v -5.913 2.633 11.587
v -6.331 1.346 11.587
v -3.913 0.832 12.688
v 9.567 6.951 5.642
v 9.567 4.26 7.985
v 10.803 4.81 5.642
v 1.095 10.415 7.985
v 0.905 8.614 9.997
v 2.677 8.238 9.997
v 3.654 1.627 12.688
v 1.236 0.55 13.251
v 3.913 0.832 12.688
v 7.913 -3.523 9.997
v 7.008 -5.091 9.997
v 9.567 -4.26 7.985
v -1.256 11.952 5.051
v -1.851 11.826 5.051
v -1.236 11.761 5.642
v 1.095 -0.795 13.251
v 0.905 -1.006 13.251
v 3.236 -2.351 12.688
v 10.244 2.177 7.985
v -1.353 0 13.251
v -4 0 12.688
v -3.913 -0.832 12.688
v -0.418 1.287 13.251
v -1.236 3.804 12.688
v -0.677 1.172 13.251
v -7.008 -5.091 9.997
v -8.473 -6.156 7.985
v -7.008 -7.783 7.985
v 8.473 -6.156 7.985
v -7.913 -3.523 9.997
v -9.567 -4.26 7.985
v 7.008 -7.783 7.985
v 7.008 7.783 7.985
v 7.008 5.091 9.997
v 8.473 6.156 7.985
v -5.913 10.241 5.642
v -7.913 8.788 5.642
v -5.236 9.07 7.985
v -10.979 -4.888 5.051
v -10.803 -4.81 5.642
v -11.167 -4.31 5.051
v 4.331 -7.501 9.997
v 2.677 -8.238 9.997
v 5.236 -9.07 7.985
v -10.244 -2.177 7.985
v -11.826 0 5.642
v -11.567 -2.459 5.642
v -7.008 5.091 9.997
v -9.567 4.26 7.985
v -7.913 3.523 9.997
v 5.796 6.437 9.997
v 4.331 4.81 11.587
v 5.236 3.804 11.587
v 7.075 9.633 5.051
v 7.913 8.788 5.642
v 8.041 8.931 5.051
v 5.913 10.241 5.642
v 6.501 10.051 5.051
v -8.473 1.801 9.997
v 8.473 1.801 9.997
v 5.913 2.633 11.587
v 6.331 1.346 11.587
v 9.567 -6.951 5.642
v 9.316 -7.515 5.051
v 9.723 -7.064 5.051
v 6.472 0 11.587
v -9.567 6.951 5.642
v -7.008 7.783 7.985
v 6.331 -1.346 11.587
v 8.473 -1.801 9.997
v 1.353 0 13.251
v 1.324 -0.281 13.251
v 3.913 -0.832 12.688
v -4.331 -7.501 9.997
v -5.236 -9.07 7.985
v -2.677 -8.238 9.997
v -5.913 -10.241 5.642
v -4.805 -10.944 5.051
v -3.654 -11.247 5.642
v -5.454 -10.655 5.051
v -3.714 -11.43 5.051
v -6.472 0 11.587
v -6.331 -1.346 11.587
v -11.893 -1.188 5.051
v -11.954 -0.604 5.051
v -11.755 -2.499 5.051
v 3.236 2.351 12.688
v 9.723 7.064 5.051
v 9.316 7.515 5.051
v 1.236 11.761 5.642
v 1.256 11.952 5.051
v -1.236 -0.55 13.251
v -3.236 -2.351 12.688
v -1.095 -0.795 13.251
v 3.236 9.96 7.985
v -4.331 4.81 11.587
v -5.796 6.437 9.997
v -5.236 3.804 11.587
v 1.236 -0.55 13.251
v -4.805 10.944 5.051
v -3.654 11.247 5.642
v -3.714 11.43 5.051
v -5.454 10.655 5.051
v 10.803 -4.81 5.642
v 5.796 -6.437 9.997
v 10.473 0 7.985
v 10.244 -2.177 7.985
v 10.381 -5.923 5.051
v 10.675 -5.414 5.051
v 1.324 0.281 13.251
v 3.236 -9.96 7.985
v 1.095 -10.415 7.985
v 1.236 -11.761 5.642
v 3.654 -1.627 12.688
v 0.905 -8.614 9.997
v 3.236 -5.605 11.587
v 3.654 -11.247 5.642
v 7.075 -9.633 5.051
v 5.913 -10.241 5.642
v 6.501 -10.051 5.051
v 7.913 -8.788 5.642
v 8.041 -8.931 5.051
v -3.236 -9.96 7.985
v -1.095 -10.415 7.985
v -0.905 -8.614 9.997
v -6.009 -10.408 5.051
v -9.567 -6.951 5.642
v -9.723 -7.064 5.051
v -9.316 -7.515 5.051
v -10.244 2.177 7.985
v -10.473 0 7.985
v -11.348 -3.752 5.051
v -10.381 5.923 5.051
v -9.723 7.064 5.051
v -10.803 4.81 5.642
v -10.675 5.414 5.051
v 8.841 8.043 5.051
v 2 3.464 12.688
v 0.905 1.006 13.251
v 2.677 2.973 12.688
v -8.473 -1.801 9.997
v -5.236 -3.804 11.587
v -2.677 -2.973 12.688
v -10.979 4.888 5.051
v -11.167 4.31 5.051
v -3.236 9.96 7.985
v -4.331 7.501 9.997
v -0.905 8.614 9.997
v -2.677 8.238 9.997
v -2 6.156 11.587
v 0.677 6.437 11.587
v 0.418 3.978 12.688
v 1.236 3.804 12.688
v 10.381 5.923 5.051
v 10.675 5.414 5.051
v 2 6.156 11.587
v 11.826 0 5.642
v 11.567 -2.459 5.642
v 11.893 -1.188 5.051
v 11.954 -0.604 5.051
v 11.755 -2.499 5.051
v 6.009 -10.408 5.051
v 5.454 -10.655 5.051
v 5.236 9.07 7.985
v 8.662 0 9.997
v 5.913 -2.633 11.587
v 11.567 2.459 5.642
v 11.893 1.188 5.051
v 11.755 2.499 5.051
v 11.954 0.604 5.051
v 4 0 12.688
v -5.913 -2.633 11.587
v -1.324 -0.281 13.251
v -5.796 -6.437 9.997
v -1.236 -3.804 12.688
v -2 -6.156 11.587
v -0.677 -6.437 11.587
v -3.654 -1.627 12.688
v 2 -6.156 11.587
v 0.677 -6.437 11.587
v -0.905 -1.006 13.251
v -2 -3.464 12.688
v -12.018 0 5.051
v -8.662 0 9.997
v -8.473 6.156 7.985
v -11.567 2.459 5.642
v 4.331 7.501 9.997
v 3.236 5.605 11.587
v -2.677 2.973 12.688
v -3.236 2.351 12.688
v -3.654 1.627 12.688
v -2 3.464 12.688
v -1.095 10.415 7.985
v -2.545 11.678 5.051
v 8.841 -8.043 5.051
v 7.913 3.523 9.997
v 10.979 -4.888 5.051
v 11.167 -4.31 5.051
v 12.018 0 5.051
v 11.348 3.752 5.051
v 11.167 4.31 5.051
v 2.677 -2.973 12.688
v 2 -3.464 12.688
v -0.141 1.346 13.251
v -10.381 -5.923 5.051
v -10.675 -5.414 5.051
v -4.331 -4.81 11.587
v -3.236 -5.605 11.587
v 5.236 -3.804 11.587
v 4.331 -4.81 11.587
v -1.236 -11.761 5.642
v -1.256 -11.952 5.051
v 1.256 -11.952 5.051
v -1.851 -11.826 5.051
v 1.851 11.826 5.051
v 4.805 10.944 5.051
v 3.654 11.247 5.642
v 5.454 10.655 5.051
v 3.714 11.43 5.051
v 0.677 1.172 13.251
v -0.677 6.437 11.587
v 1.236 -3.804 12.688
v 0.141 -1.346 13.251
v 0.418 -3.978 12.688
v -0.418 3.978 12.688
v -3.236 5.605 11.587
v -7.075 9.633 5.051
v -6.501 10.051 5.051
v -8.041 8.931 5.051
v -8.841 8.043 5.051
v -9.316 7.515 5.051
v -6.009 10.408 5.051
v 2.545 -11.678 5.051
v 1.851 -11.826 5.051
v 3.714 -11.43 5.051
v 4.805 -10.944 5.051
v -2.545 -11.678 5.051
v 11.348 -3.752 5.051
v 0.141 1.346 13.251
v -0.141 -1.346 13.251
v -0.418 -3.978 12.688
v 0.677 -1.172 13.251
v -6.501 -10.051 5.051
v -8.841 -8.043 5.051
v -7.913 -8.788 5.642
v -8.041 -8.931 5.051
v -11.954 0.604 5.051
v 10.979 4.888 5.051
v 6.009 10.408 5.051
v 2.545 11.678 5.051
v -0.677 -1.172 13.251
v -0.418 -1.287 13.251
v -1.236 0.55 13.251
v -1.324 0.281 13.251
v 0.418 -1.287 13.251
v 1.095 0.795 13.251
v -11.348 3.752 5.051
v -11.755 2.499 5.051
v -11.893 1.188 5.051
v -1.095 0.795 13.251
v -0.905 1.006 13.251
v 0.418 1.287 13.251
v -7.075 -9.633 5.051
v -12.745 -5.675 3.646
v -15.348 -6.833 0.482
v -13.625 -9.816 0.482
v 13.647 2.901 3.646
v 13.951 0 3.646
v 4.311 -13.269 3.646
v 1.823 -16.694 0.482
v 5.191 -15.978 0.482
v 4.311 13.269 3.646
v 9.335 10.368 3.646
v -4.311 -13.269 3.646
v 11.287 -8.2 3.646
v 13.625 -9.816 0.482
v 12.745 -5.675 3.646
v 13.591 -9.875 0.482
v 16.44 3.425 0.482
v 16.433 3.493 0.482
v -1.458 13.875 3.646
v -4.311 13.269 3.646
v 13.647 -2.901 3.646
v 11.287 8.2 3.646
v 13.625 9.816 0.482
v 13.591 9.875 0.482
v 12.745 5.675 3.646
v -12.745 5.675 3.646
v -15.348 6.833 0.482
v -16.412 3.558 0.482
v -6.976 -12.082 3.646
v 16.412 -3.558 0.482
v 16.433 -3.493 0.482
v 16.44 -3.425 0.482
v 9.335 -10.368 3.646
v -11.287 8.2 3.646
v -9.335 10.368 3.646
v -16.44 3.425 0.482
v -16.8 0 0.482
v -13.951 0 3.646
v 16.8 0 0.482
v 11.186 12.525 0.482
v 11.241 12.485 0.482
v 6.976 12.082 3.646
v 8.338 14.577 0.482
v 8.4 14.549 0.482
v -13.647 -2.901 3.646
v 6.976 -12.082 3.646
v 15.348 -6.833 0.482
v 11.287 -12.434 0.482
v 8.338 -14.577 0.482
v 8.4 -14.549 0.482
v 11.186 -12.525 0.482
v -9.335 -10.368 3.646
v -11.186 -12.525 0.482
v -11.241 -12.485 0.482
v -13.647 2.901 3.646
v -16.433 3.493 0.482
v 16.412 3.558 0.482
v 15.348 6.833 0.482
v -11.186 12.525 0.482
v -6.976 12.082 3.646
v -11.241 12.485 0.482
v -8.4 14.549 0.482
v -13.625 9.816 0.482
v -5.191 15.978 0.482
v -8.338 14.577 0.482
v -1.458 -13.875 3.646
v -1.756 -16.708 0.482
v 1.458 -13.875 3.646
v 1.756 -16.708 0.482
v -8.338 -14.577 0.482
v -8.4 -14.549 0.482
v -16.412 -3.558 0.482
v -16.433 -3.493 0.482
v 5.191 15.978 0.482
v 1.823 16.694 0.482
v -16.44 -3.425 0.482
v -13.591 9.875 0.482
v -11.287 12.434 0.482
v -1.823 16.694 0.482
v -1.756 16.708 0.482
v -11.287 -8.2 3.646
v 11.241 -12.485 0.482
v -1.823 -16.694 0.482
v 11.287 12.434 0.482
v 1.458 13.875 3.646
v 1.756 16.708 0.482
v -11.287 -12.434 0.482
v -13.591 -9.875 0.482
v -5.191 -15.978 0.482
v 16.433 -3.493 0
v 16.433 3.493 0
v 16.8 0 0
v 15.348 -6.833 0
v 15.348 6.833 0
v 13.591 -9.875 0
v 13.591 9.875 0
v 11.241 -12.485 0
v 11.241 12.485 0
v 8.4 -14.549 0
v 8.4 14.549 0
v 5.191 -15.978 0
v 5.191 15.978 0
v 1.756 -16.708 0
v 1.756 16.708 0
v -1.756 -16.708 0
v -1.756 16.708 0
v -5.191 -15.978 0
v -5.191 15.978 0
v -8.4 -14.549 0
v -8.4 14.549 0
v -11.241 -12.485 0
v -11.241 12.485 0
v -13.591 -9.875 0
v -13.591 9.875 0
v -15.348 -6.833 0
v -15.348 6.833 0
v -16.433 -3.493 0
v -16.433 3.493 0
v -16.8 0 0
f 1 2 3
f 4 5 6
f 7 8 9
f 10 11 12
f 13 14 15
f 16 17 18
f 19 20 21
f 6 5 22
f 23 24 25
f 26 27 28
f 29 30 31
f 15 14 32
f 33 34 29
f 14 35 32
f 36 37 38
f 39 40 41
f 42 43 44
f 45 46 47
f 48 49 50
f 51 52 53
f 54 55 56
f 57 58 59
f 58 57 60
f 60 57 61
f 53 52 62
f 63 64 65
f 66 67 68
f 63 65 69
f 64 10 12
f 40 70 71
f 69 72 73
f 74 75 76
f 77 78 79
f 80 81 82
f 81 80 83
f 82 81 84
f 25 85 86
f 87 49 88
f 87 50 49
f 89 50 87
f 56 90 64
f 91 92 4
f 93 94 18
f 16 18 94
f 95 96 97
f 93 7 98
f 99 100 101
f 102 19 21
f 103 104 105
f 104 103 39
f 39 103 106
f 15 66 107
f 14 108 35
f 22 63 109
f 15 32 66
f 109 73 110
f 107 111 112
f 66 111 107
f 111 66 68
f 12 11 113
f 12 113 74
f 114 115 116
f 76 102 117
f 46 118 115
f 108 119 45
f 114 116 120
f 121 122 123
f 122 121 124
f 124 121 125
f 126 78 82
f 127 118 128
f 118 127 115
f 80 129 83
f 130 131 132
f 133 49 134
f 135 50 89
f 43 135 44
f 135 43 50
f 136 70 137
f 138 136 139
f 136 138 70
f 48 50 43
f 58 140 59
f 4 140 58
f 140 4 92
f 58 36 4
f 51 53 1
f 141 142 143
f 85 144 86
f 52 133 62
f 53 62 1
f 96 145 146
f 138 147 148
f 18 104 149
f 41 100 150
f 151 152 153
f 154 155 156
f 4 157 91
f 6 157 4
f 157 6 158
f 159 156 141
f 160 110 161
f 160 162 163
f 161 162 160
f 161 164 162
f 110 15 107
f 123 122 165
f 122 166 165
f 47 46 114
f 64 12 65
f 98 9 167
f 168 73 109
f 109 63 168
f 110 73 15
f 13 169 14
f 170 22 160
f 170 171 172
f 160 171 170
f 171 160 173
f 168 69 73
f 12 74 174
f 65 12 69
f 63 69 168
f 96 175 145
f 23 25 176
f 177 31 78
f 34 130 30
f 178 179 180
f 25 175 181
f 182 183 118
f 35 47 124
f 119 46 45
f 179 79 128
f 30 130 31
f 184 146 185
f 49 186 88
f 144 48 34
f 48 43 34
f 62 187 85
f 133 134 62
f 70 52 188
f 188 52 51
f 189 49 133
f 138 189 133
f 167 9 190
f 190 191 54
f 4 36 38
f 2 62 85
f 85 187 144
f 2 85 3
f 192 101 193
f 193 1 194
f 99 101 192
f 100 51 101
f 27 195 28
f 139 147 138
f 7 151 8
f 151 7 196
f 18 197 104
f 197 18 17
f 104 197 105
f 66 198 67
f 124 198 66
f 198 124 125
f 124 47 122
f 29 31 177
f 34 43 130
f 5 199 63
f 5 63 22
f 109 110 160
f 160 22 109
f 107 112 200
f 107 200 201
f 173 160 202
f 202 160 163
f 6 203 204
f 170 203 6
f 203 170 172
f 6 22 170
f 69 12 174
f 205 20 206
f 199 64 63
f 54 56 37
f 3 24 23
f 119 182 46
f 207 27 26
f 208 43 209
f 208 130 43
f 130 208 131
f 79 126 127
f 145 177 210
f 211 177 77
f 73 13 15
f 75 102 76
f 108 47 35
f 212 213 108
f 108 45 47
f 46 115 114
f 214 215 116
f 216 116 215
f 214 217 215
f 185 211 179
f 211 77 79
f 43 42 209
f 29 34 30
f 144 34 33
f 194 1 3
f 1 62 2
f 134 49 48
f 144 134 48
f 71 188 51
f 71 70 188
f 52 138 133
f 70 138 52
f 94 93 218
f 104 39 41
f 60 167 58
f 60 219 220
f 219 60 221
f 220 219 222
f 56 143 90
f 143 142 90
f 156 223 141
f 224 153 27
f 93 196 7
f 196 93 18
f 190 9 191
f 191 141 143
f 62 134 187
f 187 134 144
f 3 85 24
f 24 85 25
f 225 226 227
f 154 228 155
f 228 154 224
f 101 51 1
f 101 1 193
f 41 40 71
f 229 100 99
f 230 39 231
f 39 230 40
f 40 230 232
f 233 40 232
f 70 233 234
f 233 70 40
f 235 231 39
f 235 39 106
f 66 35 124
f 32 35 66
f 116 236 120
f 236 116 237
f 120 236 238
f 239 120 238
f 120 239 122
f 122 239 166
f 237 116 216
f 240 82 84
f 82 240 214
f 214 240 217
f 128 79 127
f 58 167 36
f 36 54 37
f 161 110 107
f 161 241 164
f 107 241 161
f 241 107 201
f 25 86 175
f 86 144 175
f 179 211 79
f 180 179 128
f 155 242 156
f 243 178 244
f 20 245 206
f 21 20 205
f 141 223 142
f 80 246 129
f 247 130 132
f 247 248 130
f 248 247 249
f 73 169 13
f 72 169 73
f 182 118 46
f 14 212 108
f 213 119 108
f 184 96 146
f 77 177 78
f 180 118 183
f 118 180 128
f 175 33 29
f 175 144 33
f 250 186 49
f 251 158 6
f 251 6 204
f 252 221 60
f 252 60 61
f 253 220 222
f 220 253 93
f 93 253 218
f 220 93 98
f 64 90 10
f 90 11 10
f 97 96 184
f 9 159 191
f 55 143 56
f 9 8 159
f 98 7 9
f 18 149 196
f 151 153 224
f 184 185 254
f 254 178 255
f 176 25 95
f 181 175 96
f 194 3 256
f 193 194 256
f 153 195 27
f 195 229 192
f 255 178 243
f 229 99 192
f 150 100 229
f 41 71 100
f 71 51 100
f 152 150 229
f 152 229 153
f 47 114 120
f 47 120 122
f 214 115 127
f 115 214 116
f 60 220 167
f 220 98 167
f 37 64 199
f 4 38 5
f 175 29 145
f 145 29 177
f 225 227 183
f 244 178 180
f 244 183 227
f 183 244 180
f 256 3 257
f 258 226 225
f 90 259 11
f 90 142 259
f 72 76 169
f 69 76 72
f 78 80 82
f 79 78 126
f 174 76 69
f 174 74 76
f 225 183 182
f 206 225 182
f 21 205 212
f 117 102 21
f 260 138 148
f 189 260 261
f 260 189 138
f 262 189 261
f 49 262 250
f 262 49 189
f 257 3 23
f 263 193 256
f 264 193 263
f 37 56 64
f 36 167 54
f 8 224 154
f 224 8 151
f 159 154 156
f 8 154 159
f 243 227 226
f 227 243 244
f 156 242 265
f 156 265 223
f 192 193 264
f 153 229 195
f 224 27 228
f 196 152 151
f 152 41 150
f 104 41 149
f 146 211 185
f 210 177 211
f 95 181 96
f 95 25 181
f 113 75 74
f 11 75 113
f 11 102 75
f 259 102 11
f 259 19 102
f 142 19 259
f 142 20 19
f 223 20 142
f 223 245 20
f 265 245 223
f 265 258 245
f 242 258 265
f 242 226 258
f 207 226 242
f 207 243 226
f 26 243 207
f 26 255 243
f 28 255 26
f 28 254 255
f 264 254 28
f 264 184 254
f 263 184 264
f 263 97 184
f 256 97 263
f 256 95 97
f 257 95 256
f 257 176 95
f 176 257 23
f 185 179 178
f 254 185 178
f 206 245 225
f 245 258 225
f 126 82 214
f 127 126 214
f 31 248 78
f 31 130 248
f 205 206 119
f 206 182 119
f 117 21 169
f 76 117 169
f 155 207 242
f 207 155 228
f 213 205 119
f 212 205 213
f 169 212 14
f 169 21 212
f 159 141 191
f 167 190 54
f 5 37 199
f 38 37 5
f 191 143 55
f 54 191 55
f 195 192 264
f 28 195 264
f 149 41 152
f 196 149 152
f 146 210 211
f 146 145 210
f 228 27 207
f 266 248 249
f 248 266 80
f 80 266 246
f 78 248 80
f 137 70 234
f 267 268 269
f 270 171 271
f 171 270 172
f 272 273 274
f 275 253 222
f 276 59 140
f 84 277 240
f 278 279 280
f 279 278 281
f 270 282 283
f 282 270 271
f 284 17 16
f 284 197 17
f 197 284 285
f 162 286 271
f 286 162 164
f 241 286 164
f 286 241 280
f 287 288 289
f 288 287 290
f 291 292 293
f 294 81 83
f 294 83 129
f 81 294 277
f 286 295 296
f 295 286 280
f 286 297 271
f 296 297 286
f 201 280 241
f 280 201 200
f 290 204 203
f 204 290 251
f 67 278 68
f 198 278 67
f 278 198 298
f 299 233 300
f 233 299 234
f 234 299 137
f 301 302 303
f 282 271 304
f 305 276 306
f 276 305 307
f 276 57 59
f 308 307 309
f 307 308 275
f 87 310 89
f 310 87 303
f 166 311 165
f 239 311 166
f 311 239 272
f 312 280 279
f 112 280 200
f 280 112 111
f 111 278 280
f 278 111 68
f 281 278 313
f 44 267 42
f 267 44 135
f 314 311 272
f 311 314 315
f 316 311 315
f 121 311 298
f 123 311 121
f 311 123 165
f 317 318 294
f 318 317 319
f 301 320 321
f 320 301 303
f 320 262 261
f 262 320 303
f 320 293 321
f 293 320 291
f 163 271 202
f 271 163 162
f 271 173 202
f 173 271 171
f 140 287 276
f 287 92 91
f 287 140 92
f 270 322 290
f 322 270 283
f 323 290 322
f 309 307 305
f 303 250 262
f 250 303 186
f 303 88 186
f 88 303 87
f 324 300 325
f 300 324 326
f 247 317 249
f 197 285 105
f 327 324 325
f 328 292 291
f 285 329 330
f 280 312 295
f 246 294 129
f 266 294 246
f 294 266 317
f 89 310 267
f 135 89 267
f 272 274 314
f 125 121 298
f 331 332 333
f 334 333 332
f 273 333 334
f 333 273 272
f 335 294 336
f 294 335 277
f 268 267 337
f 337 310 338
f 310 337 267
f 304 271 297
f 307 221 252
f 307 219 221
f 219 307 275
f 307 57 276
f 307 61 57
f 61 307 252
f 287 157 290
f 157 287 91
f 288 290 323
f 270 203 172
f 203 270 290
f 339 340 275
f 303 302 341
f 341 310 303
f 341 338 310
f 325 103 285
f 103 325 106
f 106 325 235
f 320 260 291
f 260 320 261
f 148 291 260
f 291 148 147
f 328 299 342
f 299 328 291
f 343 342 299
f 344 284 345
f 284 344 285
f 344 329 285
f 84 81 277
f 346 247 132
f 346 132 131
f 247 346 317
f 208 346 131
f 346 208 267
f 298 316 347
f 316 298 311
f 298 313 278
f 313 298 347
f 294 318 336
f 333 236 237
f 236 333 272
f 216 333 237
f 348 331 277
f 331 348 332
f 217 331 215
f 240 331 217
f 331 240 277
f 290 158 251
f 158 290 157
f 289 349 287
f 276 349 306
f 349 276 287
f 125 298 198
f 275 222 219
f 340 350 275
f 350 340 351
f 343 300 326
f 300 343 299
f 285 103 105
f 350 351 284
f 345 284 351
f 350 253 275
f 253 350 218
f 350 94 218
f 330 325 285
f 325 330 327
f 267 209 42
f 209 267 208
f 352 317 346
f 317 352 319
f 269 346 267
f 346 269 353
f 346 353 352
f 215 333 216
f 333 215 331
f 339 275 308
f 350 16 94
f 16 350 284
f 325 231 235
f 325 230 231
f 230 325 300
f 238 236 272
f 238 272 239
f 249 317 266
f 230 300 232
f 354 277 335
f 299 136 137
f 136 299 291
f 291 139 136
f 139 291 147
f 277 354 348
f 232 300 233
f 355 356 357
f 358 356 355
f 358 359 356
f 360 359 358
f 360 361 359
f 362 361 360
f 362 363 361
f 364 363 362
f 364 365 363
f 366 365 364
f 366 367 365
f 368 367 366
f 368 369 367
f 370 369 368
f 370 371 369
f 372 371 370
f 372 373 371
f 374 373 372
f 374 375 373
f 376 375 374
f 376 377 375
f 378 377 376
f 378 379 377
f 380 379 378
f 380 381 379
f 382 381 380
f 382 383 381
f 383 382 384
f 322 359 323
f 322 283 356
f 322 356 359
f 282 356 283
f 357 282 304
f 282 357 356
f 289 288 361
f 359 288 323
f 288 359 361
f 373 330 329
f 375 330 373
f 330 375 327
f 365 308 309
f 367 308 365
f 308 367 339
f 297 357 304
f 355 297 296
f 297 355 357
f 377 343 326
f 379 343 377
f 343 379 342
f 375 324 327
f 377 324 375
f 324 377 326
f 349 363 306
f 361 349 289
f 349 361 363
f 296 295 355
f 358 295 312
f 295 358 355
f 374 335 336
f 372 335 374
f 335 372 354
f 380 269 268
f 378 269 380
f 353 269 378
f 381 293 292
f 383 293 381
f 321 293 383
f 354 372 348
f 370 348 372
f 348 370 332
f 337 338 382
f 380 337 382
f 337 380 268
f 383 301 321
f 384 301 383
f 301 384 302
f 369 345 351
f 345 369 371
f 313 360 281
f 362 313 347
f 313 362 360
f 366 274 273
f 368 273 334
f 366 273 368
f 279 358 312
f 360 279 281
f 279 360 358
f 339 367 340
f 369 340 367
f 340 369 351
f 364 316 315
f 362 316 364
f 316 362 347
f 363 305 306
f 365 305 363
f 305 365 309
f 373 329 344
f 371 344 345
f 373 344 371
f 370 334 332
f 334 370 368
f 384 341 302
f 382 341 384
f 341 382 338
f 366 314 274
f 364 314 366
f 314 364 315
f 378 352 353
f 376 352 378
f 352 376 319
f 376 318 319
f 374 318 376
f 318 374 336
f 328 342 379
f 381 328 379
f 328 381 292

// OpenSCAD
//Diameter of the iris mm
iris_diam = 25;


sph_rad_1 = iris_diam*1.0356/2;
sph_rad_2 = iris_diam*1.668/2;
sph_offset = iris_diam*0.489;
outer_rad = iris_diam*1.344/2;
rim_height = 0.5;
sph_center_2 = rim_height -  pow(pow(sph_rad_2,2) - pow(outer_rad,2),0.5);
sph_center_1 = sph_center_2 + sph_offset;

intersection(){
    translate([0,0,0])cylinder(100,   outer_rad, outer_rad, true);
intersection() {
    translate([0,0,100])cube(200, center=true);
    union() {
    translate([0,0,sph_center_1])sphere(sph_rad_1);
    translate([0,0,sph_center_2])sphere(sph_rad_2); 
}
}
}


echo(version=version());
